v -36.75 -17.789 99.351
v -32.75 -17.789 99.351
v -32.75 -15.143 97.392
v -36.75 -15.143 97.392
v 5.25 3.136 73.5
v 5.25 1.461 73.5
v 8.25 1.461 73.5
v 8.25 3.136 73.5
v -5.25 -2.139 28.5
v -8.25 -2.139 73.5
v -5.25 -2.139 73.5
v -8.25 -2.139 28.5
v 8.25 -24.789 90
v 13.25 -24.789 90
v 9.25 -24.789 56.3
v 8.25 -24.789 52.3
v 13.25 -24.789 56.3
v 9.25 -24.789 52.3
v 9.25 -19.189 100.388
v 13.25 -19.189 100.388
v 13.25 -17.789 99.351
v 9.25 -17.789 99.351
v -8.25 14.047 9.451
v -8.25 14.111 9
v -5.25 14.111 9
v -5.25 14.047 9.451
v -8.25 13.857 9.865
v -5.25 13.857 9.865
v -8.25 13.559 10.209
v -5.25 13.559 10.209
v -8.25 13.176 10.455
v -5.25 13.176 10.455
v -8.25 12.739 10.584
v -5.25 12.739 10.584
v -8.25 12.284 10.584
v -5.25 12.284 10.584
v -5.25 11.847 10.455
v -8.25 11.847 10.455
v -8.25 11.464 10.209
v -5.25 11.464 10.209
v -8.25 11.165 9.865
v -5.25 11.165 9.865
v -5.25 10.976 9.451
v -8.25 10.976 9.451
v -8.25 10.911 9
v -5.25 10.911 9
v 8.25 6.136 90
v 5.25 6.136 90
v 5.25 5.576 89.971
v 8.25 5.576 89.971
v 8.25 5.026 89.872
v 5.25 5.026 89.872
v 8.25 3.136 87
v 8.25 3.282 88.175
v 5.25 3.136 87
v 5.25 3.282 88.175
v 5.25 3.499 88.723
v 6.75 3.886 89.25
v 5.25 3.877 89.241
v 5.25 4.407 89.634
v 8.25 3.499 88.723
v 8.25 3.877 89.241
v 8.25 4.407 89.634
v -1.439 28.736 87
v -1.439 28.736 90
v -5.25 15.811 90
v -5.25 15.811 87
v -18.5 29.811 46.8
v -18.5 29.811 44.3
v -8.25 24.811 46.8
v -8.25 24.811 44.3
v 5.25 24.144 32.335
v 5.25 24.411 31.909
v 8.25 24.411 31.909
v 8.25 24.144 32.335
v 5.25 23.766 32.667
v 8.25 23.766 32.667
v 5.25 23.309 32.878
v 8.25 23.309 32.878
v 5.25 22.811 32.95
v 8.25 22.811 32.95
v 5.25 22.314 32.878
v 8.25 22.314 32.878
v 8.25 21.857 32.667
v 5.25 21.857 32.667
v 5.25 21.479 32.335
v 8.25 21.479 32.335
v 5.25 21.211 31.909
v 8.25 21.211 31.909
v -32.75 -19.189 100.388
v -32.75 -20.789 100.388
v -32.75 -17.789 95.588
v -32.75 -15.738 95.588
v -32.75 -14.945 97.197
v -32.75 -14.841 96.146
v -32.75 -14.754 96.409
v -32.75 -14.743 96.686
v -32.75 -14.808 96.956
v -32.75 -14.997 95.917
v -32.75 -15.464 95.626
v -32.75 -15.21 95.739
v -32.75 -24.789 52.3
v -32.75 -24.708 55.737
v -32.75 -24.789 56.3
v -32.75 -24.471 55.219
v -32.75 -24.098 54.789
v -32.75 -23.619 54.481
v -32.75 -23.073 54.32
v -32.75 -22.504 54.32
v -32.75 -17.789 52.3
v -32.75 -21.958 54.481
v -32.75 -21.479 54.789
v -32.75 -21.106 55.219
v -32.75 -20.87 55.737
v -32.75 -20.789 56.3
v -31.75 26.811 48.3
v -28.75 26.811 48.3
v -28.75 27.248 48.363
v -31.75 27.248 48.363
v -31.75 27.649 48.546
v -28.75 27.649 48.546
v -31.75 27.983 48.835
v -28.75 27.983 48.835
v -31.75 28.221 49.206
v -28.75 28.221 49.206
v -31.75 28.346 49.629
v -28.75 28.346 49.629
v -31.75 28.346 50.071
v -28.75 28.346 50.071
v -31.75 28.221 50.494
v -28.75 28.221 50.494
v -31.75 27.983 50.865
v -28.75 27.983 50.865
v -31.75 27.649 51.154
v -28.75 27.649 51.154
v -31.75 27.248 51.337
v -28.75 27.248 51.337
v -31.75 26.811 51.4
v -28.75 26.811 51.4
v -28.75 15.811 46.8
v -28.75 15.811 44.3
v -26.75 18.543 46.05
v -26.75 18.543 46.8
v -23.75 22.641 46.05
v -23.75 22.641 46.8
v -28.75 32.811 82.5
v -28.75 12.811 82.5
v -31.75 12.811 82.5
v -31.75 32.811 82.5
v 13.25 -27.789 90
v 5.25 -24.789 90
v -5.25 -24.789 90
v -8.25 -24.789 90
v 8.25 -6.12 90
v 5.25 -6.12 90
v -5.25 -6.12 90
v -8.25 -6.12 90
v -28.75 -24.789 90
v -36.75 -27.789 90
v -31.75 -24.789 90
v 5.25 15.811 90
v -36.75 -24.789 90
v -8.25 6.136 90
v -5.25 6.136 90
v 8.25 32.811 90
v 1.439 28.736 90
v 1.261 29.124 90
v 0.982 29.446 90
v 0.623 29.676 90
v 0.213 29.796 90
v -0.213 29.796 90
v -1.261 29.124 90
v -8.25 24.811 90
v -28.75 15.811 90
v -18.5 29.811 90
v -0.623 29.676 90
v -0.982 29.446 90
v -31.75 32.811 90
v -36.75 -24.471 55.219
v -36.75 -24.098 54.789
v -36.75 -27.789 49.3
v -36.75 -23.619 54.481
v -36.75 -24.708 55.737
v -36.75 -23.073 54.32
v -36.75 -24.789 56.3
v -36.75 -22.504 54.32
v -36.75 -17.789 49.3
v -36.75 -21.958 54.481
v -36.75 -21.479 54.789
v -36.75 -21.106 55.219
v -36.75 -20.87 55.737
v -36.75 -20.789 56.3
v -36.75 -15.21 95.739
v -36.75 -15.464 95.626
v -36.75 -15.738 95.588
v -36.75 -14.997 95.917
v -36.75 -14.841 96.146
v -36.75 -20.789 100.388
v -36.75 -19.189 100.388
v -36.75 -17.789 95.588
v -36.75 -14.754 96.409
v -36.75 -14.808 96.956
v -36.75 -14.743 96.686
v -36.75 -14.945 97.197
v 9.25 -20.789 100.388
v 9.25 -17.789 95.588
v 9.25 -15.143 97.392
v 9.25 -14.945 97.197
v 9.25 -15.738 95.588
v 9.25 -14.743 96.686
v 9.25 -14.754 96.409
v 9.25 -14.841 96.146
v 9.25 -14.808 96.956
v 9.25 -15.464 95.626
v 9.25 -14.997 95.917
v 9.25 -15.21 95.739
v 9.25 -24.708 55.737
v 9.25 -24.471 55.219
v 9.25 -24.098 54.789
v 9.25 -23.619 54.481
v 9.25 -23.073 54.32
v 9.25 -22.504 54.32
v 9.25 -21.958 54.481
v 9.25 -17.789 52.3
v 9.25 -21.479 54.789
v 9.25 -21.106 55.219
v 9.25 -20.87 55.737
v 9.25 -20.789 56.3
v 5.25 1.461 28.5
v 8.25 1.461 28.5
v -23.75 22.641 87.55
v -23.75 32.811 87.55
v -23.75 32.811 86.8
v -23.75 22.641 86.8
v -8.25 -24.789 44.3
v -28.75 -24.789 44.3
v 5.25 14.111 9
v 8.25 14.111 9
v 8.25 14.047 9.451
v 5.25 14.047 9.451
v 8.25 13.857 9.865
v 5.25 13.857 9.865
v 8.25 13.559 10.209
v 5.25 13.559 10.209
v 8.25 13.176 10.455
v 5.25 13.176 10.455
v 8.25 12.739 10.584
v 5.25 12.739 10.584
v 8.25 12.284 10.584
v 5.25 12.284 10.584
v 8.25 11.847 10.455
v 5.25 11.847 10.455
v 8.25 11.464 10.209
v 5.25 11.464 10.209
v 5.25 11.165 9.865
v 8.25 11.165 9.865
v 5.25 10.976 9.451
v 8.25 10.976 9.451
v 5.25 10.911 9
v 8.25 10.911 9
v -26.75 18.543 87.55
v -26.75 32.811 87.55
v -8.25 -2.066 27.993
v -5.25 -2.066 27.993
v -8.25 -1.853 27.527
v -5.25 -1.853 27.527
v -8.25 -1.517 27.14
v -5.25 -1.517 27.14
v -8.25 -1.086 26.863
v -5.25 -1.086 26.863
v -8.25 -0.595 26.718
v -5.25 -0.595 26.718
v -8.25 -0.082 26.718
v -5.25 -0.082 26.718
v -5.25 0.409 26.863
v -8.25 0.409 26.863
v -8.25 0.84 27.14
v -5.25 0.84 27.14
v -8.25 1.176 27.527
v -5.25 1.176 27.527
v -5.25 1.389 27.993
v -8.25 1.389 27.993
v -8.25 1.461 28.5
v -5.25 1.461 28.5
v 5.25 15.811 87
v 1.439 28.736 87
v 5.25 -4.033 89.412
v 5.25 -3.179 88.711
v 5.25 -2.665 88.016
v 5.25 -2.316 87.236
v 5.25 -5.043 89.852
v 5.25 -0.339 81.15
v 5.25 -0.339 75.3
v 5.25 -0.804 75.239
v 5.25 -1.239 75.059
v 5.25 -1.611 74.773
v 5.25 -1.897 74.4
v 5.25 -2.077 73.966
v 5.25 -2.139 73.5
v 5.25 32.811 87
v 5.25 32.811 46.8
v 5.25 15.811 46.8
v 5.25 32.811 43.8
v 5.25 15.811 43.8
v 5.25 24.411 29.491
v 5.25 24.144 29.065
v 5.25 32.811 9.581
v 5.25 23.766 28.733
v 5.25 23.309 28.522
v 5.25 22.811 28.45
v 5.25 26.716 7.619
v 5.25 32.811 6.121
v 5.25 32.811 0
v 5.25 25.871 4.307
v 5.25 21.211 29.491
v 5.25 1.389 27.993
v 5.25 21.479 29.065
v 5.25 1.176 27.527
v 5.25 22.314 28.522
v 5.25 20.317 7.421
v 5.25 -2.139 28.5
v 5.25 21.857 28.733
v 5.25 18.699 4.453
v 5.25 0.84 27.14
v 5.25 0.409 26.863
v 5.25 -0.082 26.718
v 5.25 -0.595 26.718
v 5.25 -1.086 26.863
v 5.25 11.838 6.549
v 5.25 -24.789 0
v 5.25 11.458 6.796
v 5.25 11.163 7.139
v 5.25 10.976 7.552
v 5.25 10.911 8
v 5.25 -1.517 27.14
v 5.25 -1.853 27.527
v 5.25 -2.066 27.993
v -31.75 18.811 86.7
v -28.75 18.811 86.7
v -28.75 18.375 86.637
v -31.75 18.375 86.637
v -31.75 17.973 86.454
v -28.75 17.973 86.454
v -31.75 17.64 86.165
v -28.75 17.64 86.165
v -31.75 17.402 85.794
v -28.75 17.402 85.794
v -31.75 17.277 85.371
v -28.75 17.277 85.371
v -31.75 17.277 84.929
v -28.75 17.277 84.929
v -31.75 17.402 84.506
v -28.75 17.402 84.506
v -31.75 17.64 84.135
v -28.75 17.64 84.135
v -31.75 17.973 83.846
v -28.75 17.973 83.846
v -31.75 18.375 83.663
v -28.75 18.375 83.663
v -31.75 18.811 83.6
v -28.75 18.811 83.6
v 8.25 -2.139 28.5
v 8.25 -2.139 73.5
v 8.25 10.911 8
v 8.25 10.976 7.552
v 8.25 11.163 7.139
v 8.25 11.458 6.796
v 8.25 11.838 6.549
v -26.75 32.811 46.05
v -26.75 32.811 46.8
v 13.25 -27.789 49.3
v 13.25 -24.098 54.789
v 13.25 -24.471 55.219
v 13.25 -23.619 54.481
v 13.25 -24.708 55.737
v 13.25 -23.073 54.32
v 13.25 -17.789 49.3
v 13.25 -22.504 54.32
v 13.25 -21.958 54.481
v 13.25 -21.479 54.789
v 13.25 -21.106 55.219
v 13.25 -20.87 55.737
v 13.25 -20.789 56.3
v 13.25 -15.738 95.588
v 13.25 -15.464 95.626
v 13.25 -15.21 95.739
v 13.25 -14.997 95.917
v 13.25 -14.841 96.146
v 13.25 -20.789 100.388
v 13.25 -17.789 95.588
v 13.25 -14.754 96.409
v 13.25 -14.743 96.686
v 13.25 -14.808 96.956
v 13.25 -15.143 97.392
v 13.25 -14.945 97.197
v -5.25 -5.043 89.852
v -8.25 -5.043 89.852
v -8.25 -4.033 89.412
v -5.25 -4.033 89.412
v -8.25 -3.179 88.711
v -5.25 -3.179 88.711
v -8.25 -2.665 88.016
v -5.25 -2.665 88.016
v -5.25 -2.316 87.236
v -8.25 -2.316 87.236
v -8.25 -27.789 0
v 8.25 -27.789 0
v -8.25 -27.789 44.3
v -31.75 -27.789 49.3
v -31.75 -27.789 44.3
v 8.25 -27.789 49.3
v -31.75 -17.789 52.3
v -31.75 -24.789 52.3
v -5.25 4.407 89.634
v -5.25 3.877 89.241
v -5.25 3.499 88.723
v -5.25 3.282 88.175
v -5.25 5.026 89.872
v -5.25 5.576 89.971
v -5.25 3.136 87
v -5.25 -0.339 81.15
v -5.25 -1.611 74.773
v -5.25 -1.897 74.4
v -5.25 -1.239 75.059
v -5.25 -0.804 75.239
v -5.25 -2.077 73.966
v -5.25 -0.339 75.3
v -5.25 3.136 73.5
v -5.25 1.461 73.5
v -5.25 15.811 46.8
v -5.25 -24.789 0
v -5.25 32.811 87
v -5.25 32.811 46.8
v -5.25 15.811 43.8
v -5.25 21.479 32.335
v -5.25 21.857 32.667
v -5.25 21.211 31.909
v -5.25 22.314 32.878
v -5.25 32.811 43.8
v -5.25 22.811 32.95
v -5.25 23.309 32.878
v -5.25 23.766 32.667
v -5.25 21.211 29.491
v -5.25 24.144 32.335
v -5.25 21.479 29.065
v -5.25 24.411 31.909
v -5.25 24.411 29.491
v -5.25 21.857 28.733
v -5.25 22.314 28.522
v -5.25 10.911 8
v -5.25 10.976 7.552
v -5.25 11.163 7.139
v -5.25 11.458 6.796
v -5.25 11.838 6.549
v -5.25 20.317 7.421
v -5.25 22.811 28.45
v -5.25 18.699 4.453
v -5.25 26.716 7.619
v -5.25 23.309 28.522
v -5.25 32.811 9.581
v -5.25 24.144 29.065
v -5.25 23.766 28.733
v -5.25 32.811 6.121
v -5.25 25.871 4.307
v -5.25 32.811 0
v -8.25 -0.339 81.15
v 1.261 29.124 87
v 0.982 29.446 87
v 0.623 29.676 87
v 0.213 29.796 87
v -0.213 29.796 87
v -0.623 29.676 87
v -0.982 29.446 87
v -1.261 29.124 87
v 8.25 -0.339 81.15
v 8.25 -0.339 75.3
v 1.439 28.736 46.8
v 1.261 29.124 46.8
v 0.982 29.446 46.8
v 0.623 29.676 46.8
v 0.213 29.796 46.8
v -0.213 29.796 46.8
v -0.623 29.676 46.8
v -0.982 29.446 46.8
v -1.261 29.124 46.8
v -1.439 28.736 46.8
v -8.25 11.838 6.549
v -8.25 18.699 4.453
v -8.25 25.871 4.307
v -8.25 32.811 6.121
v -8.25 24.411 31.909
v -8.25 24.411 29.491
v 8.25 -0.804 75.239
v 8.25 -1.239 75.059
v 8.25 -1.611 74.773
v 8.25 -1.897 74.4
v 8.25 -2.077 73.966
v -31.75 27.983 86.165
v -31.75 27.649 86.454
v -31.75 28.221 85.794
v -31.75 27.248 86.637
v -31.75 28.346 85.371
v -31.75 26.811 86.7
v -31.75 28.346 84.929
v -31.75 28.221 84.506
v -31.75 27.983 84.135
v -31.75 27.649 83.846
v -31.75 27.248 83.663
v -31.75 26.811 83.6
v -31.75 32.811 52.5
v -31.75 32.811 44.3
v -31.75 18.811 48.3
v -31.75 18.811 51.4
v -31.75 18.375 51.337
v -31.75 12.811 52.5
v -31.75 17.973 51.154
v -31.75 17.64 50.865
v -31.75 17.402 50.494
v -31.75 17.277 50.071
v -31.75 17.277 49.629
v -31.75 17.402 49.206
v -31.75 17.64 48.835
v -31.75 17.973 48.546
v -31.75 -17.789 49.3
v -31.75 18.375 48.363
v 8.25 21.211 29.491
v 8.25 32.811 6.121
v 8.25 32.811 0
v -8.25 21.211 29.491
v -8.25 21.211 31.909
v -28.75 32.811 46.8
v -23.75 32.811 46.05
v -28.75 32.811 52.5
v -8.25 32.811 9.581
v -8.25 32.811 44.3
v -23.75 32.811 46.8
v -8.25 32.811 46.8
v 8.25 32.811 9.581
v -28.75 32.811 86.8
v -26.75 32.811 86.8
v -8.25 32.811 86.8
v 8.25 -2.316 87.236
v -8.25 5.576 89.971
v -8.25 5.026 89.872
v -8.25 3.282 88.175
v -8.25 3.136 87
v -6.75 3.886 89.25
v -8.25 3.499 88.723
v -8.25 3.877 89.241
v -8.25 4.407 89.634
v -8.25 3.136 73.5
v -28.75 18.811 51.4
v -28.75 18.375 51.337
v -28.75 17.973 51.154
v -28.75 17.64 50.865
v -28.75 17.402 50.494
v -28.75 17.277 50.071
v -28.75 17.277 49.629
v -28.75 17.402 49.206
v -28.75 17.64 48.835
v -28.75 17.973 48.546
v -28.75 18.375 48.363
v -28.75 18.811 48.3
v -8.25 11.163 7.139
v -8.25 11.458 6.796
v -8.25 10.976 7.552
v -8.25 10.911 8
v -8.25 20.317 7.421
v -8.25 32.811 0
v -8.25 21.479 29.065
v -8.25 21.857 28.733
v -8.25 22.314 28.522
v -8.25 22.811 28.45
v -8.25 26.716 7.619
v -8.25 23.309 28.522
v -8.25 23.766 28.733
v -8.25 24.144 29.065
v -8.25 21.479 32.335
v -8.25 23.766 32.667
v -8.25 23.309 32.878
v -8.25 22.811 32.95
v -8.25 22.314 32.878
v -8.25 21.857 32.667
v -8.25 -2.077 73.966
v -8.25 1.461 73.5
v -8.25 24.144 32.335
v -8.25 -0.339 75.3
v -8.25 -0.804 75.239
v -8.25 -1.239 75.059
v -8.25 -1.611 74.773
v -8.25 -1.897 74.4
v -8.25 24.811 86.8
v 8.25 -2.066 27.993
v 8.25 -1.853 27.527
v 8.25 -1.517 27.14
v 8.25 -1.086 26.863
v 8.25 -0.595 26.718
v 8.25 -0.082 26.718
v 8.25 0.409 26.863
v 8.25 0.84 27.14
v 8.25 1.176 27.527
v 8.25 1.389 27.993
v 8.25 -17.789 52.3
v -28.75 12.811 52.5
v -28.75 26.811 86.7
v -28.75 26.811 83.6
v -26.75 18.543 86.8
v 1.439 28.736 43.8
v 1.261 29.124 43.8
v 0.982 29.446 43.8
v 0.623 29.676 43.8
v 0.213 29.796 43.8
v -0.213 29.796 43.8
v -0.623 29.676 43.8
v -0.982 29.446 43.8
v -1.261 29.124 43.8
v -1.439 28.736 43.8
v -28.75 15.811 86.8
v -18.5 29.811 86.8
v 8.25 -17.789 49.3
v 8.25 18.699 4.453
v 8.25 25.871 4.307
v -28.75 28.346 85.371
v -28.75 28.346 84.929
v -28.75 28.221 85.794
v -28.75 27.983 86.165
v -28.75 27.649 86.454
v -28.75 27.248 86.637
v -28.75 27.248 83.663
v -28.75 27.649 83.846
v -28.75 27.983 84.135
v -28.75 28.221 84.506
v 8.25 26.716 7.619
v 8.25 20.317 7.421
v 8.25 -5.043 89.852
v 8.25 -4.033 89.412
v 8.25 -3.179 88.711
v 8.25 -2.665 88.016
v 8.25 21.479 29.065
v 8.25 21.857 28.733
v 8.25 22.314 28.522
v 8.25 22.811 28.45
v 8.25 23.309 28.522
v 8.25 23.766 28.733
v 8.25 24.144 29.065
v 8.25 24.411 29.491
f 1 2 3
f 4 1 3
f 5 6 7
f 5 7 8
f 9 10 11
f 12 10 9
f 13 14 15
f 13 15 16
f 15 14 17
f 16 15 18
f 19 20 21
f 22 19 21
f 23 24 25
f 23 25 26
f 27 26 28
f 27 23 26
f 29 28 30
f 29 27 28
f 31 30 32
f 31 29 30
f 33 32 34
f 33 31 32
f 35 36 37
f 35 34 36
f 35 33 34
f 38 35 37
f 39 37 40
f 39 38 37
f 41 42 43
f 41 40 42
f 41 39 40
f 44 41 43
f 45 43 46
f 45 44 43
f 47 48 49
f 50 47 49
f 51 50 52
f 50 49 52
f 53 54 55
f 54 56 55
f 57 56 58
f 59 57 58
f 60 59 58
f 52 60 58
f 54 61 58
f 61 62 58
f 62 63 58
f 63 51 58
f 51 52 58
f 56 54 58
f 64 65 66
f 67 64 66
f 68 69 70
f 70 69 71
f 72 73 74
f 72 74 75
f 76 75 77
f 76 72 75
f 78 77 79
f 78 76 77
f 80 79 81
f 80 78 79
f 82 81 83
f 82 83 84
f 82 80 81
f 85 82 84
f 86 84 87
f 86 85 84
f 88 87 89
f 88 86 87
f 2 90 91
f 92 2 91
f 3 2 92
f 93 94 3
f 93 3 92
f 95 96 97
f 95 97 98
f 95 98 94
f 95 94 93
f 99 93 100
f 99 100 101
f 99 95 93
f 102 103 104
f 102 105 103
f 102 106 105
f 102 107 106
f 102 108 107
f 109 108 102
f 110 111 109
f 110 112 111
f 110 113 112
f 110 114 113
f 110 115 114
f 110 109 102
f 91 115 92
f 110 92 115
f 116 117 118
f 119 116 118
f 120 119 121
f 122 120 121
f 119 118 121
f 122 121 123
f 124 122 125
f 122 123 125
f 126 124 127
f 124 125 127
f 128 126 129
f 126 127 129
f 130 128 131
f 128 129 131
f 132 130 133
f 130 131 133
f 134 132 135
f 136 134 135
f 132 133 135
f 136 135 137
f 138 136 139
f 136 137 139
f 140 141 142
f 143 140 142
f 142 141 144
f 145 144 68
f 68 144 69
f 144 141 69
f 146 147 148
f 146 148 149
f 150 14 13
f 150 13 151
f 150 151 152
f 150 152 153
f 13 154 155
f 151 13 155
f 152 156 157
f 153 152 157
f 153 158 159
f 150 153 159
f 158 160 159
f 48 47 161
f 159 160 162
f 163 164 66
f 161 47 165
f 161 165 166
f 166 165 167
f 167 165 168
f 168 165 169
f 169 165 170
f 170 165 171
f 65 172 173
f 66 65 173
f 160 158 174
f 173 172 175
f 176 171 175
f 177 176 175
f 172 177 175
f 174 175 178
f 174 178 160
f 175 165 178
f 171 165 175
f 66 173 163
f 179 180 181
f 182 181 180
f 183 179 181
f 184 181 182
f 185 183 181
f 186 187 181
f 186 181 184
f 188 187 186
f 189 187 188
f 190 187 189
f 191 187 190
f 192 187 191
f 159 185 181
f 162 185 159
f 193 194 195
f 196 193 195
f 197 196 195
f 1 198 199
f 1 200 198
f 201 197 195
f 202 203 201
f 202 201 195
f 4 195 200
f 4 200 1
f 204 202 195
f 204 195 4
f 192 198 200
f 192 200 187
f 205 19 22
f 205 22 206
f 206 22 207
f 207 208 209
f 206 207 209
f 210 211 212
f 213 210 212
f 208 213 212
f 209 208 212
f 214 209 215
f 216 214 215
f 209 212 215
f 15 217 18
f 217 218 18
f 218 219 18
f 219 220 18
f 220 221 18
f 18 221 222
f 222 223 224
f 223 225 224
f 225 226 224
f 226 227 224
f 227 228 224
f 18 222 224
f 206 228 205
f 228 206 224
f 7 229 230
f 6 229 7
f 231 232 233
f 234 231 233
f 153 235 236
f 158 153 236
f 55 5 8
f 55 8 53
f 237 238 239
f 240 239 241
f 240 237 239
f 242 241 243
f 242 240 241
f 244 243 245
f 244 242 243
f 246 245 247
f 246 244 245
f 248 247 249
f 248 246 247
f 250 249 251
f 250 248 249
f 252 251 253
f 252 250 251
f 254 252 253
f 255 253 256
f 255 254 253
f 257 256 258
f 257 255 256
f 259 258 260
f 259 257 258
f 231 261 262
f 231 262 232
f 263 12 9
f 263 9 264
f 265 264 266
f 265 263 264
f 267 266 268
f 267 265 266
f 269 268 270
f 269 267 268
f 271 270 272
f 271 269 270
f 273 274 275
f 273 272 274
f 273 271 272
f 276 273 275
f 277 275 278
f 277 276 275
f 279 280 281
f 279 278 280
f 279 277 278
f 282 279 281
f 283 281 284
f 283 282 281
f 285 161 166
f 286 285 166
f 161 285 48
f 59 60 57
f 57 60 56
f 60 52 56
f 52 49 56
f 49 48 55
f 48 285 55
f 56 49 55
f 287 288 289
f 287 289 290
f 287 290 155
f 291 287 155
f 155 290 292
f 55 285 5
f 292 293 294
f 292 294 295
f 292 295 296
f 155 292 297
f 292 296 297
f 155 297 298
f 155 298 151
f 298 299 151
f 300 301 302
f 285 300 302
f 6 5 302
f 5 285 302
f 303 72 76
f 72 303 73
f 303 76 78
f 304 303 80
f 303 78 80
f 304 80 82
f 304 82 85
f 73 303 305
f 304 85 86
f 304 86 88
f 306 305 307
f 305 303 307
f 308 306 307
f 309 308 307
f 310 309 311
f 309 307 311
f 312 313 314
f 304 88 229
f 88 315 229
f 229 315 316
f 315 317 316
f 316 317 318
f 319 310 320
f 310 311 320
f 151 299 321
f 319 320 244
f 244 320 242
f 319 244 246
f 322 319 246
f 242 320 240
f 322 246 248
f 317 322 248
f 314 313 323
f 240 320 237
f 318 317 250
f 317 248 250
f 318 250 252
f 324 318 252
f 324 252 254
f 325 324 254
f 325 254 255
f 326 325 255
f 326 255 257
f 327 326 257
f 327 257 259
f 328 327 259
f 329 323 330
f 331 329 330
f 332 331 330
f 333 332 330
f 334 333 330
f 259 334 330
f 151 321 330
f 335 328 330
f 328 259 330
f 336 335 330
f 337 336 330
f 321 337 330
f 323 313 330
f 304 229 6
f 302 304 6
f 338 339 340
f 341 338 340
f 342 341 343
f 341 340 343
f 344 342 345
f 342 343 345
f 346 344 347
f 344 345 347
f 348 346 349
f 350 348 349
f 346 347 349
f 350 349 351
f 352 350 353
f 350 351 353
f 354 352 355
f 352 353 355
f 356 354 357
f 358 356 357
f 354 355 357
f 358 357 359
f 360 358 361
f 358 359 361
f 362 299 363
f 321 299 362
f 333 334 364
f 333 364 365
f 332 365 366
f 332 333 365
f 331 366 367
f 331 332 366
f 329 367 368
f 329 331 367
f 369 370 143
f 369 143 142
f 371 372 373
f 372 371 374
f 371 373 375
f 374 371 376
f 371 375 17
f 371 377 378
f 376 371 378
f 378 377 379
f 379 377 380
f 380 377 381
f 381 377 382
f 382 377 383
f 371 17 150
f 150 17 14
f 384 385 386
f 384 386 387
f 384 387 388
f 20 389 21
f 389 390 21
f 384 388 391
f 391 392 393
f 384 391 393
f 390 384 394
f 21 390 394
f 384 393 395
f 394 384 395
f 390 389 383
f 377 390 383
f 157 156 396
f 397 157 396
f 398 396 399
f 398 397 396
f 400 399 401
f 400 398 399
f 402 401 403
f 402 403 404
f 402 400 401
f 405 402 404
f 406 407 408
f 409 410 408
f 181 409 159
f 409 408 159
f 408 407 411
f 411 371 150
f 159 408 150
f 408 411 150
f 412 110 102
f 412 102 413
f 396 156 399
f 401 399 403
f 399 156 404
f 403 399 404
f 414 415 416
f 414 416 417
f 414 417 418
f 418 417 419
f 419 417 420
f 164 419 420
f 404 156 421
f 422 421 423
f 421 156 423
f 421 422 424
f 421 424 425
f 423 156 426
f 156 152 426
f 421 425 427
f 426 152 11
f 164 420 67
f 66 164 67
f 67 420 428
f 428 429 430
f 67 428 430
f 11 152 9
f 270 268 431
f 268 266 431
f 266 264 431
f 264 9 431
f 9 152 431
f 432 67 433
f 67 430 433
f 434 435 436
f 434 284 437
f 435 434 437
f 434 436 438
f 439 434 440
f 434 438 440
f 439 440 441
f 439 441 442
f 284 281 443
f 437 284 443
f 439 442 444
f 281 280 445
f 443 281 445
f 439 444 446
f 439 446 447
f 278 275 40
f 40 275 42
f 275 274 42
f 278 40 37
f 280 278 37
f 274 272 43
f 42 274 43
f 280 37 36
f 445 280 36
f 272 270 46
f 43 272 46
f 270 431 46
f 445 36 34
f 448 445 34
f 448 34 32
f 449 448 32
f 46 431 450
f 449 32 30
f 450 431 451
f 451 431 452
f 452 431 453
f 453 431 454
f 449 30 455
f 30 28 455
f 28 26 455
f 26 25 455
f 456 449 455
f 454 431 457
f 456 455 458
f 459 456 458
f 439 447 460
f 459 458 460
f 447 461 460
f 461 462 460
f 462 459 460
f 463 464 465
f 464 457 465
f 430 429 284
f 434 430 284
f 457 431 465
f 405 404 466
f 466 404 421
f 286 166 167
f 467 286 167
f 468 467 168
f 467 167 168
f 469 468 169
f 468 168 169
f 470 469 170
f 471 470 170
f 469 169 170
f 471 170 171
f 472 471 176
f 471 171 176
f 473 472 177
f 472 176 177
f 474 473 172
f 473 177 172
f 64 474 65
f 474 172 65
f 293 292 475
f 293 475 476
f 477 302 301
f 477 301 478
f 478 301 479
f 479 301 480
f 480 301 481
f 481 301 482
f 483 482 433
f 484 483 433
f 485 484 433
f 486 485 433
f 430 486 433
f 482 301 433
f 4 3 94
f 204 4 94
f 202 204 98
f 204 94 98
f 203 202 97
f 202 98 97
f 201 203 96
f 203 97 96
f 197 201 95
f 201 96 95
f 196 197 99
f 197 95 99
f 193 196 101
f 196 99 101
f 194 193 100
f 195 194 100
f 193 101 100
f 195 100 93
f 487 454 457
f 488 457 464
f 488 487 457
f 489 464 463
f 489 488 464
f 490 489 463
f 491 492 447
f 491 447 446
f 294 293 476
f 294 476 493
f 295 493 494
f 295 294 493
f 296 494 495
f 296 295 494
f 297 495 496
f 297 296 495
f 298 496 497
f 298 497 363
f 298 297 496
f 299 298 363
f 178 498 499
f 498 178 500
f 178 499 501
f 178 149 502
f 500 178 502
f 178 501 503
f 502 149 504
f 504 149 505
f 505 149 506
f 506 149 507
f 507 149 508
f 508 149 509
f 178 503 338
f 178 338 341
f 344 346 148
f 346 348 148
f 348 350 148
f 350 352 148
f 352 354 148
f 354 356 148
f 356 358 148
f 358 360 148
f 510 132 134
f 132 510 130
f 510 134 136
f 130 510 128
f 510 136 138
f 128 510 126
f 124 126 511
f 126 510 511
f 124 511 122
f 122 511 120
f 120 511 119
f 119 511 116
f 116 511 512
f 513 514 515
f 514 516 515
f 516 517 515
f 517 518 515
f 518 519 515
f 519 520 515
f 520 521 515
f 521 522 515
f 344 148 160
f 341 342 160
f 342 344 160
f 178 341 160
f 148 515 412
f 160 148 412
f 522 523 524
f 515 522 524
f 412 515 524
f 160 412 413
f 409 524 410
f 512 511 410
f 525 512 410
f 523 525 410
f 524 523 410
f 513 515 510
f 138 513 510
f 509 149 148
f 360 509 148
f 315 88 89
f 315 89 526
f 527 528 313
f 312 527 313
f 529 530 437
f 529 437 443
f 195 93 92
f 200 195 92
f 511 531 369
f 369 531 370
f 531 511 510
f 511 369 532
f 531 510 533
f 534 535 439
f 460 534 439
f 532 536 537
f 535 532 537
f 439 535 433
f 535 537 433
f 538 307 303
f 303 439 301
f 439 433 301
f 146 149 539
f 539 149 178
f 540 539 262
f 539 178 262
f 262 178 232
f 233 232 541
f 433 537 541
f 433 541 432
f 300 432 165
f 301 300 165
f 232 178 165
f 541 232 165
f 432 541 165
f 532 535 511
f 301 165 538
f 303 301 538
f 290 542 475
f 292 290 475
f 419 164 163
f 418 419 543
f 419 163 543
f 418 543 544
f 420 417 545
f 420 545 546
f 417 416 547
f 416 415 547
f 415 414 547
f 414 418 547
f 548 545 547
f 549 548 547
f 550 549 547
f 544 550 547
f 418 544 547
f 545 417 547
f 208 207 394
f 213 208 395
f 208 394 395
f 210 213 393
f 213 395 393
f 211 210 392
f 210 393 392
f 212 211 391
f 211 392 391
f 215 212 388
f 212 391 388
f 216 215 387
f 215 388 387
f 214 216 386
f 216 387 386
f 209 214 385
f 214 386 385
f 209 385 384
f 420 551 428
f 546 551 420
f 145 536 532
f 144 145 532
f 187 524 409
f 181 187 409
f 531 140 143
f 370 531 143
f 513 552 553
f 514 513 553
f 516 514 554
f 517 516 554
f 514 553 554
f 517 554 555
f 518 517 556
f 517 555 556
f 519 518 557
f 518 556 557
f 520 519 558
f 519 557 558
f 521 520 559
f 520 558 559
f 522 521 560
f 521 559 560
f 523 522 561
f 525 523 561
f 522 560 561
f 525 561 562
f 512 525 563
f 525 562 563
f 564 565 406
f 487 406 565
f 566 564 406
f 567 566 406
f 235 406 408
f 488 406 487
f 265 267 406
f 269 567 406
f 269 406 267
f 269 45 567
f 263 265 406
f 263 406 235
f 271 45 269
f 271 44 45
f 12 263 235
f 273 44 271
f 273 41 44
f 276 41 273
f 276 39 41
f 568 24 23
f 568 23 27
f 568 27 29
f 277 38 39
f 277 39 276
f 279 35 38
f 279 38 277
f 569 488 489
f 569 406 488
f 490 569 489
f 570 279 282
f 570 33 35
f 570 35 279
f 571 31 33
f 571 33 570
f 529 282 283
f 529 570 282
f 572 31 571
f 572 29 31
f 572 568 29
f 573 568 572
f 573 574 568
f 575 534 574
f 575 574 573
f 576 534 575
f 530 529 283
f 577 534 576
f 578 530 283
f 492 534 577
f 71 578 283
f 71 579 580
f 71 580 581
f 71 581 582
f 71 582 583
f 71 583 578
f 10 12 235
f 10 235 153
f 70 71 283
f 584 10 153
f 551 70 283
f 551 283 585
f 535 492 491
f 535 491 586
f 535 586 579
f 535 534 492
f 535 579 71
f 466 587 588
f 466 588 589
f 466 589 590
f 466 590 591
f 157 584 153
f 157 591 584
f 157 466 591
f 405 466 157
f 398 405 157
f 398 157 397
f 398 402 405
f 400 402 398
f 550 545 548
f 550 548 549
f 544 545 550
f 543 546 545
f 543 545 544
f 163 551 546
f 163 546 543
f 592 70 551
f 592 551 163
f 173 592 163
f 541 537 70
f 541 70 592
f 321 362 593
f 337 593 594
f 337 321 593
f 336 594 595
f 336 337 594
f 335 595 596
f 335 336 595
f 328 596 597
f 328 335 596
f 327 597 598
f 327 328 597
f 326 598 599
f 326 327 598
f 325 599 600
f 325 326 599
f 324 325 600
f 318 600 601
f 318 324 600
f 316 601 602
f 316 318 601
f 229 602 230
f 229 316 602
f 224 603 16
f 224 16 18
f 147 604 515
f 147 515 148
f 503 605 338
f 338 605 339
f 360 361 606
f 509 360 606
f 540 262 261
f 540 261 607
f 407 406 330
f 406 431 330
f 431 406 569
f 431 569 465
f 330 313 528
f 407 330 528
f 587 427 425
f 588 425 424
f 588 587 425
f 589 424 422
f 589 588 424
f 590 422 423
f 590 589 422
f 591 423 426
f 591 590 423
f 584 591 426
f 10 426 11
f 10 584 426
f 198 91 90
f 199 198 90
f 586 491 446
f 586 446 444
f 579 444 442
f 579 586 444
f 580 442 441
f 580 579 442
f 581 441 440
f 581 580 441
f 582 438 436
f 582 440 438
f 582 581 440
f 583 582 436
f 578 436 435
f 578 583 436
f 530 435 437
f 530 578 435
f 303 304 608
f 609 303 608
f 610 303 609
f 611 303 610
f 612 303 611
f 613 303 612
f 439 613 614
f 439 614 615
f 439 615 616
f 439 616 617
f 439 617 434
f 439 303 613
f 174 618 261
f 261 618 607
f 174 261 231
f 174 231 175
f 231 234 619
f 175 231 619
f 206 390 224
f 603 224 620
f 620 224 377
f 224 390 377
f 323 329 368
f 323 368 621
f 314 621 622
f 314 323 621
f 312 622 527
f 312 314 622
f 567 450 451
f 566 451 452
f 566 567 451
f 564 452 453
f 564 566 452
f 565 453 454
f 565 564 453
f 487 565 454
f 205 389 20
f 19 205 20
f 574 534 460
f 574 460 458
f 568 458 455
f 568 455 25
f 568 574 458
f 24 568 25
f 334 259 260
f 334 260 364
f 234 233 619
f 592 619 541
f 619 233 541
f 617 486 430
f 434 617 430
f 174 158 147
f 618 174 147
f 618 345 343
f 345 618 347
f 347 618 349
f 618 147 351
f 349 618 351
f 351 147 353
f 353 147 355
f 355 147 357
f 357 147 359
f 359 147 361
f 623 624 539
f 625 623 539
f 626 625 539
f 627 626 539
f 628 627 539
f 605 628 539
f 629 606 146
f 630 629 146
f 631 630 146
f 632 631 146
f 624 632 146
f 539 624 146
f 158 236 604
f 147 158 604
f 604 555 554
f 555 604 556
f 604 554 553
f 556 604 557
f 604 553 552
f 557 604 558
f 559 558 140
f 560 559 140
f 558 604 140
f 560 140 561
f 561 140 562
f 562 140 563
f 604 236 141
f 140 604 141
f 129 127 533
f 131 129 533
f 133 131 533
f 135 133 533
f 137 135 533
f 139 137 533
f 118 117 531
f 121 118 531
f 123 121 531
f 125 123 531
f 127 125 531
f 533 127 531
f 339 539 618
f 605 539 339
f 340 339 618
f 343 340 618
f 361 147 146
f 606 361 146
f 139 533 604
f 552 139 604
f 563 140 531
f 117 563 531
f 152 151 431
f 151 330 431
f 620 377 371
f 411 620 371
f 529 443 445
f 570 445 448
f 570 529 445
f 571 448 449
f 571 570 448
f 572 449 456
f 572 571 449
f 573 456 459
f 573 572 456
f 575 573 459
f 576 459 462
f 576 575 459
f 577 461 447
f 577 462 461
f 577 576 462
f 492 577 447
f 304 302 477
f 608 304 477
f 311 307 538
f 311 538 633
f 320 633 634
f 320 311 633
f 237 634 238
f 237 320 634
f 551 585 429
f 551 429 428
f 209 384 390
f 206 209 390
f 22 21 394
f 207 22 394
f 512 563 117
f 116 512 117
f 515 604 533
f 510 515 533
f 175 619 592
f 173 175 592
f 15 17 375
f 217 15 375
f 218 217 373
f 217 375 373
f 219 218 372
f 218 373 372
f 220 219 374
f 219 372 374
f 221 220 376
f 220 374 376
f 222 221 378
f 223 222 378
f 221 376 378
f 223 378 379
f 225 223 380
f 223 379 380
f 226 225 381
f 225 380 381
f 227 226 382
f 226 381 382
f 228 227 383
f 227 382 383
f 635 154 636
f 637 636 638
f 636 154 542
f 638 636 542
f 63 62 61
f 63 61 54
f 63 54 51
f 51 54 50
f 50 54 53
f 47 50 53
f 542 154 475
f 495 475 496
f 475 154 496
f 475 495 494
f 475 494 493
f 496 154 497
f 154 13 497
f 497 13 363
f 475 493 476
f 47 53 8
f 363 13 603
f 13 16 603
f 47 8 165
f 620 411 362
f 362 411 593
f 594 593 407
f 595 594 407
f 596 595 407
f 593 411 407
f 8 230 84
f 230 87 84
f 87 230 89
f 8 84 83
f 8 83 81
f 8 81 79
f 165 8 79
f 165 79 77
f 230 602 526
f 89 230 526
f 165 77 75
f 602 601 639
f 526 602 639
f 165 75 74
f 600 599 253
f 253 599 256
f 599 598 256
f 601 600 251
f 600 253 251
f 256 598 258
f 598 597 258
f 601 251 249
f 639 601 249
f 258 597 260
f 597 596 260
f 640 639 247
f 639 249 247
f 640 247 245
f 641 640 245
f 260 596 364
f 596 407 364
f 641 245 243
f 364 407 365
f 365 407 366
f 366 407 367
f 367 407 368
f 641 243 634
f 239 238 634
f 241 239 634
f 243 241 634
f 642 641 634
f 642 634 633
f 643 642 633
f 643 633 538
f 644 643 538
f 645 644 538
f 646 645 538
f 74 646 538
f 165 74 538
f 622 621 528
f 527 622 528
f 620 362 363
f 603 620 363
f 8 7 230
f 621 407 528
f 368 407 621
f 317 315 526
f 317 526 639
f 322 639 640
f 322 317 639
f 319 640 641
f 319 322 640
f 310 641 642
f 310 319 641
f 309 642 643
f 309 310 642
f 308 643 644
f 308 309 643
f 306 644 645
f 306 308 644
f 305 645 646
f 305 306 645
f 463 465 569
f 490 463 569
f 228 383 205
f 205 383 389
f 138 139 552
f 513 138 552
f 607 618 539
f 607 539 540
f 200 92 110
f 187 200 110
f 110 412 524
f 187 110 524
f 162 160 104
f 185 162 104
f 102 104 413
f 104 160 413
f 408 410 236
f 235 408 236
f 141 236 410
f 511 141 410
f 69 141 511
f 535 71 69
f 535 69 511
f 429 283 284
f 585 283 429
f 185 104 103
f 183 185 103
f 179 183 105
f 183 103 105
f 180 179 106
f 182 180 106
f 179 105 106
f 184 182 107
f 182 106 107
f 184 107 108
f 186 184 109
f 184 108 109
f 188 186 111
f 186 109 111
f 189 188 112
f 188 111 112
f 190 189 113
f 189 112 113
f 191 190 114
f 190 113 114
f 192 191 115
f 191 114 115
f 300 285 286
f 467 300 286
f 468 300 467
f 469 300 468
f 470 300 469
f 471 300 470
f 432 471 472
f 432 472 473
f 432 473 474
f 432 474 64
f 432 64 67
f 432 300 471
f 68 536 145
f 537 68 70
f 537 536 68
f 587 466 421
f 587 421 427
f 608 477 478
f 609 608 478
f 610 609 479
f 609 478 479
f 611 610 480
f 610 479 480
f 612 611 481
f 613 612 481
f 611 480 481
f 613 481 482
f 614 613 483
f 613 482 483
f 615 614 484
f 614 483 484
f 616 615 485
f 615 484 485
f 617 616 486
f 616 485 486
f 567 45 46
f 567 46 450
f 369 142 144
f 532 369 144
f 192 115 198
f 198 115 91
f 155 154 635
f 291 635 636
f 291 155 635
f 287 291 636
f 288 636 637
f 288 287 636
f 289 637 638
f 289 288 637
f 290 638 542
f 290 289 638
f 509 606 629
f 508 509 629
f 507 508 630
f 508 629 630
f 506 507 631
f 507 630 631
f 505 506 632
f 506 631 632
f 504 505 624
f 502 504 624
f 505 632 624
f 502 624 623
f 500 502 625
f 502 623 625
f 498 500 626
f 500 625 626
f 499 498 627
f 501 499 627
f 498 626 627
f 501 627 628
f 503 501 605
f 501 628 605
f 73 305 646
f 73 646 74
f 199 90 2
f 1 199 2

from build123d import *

# Parameters (mm, degrees)
SKETCH1_W                    = 20.5
SKETCH1_H                    = 3
SKETCH1_W_2                  = 3
SKETCH1_W_3                  = 10.5
SKETCH1_H_2                  = 2
MAIN_EXTRUDE_DEPTH           = 90
SWITCH_LEVER_START           = -16.5
SWITCH_LEVER_HOLES_DEPTH     = 16.5
SERVO_START                  = -23.5
SKETCH3_W                    = 30
SKETCH3_H                    = 20
SKETCH3_W_2                  = 44.3
SKETCH3_H_2                  = 60.6
SERVO_MOUNT_SLOTS_DEPTH      = 23.5
SERVO_HOLE_EXPANSION_REACH   = 70.75
SKETCH4_W                    = 20.5
SKETCH4_H                    = 8
SERVO_HOLE_EXPANSION_2_REACH = 115.051
SKETCH5_W                    = 20.5
SKETCH5_H                    = 40
SKETCH5_W_2                  = 10.5
SKETCH5_H_2                  = 12
SKETCH5_H_3                  = 68
TAB1_DEPTH                   = 5
TAB2_START                   = -45
TAB2_DEPTH                   = 5
TAB_SPACER_REACH             = 124.885
SKETCH7_W                    = 1
SKETCH7_H                    = 48.088
LEVER_SHELF_DEPTH            = 10.5
SKETCH10_W                   = 10.5
SKETCH10_H                   = 3.45
CUT_EXTRUDE2_DEPTH           = 45
BOSS_EXTRUDE1_DEPTH          = 3
BOSS_EXTRUDE2_START          = -43.2
BOSS_EXTRUDE2_DEPTH          = 3
FILLET1_SIZE                 = 3
CUT_EXTRUDE3_REACH           = 124.885
SKETCH12_W                   = 3
SKETCH12_H                   = 0.75
CUT_EXTRUDE4_REACH           = 116.801
FILLET2_R                    = 4


with BuildPart() as part:
    # Sketch1 → Main Extrude (new body)
    with BuildSketch(Plane.XY):
        Polygon((-8.25, 32.811469611), (-28.75, 32.811469611), (-28.75, 15.811469611), (-18.5, 29.811469611), (-8.25, 24.811469611), align=None)
        Polygon((-28.75, 15.811469611), (-28.75, 32.811469611), (-31.75, 32.811469611), (-31.75, -24.788530389), (-28.75, -24.788530389), align=None)
        with Locations((-18.5, -26.288530389)):
            Rectangle(SKETCH1_W, SKETCH1_H)
        with Locations((-30.25, -26.288530389)):
            Rectangle(SKETCH1_W_2, SKETCH1_H)
        with Locations((-6.75, -26.288530389)):
            Rectangle(SKETCH1_W_2, SKETCH1_H)
        Polygon((-5.25, 32.811469611), (-8.25, 32.811469611), (-8.25, 24.811469611), (-8.25, -24.788530389), (-5.25, -24.788530389), (-5.25, 3.911469611), (-5.25, 5.911469611), align=None)
        with Locations((0, -26.288530389)):
            Rectangle(SKETCH1_W_3, SKETCH1_H)
        with Locations((6.75, -26.288530389)):
            Rectangle(SKETCH1_W_2, SKETCH1_H)
        Polygon((5.25, 32.811469611), (5.25, 5.911469611), (5.25, 3.911469611), (5.25, -24.788530389), (8.25, -24.788530389), (8.25, 32.811469611), align=None)
        with Locations((0, 4.911469611)):
            Rectangle(SKETCH1_W_3, SKETCH1_H_2)
    extrude(amount=MAIN_EXTRUDE_DEPTH)

    # Sketch2 → Switch/Lever Holes (cut)
    with BuildSketch(Plane(origin=(8.25, 0, 0), x_dir=(0, 0, -1), z_dir=(1, 0, 0)).offset(SWITCH_LEVER_START)):
        with BuildLine():
            Line((-90, -0.338530389), (-75.3, -0.338530389))
            ThreePointArc((-75.3, -0.338530389), (-74.772792206, -1.611322596), (-73.5, -2.138530389))
            Line((-73.5, -2.138530389), (-28.5, -2.138530389))
            ThreePointArc((-28.5, -2.138530389), (-26.7, -0.338530389), (-28.5, 1.461469611))
            Line((-28.5, 1.461469611), (-73.5, 1.461469611))
            Line((-73.5, 1.461469611), (-73.5, 3.136469611))
            Line((-73.5, 3.136469611), (-90, 3.136469611))
            Line((-90, 3.136469611), (-90, -0.338530389))
        make_face()
        with BuildLine():
            Line((-29.491127656, 24.411469611), (-31.908872344, 24.411469611))
            ThreePointArc((-31.908872344, 24.411469611), (-32.95, 22.811469611), (-31.908872344, 21.211469611))
            Line((-31.908872344, 21.211469611), (-29.491127656, 21.211469611))
            ThreePointArc((-29.491127656, 21.211469611), (-28.45, 22.811469611), (-29.491127656, 24.411469611))
        make_face()
        with BuildLine():
            Line((-9, 10.911469611), (-8, 10.911469611))
            ThreePointArc((-8, 10.911469611), (-7.139020973, 11.162872148), (-6.548607336, 11.838075717))
            ThreePointArc((-6.548607336, 11.838075717), (-4.132373754, 22.279858493), (-6.120885638, 32.811469611))
            Line((-6.120885638, 32.811469611), (-9.58131915, 32.811469611))
            ThreePointArc((-9.58131915, 32.811469611), (-7.295349446, 23.52349699), (-9, 14.111469611))
            ThreePointArc((-9, 14.111469611), (-10.6, 12.511469611), (-9, 10.911469611))
        make_face()
    extrude(amount=SWITCH_LEVER_HOLES_DEPTH, mode=Mode.SUBTRACT)

    # Sketch3 → Servo Mount Slots (cut)
    with BuildSketch(Plane.ZY.offset(31.75).offset(SERVO_START)):
        with Locations((67.5, 22.811469611)):
            Rectangle(SKETCH3_W, SKETCH3_H)
        with BuildLine():
            Line((51.4, 26.811469611), (51.4, 18.811469611))
            ThreePointArc((51.4, 18.811469611), (49.85, 17.261469611), (48.3, 18.811469611))
            Line((48.3, 18.811469611), (48.3, 26.811469611))
            ThreePointArc((48.3, 26.811469611), (49.85, 28.361469611), (51.4, 26.811469611))
        make_face()
        with BuildLine():
            Line((86.7, 26.811469611), (86.7, 18.811469611))
            ThreePointArc((86.7, 18.811469611), (85.15, 17.261469611), (83.6, 18.811469611))
            Line((83.6, 18.811469611), (83.6, 26.811469611))
            ThreePointArc((83.6, 26.811469611), (85.15, 28.361469611), (86.7, 26.811469611))
        make_face()
        with Locations((22.15, 2.511469611)):
            Rectangle(SKETCH3_W_2, SKETCH3_H_2)
    extrude(amount=SERVO_MOUNT_SLOTS_DEPTH, mode=Mode.SUBTRACT)

    # Servo Hole Expansion: up to this face of the body (flat: up to its plane)
    servo_hole_expansion_end = Plane(part.part.faces().sort_by_distance((-9.616666667, 26.144802944, 83.6))[0])
    # Sketch4 → Servo Hole Expansion (cut, up to the picked face)
    with BuildSketch(Plane(origin=(0, 0, 51.4), x_dir=(-1, 0, 0), z_dir=(0, 0, -1)), mode=Mode.PRIVATE) as servo_hole_expansion_sk1:
        with Locations((18.5, 28.811469611)):
            Rectangle(SKETCH4_W, SKETCH4_H)
    servo_hole_expansion_tool1 = split(extrude(servo_hole_expansion_sk1.sketch, amount=-SERVO_HOLE_EXPANSION_REACH, mode=Mode.PRIVATE), bisect_by=servo_hole_expansion_end, keep=Keep.BOTH, mode=Mode.PRIVATE)
    add(servo_hole_expansion_tool1.solids().sort_by(Axis((-18.5, 28.81147, 51.4), (0, 0, 1)))[0], mode=Mode.SUBTRACT)

    # Servo Hole Expansion 2: up to this face of the body (flat: up to its plane)
    servo_hole_expansion_2_end = Plane(part.part.faces().sort_by_distance((-18.5, -24.788530389, 67.15))[0])
    # Sketch5 → Servo Hole Expansion 2 (cut, up to the picked face)
    with BuildSketch(Plane(origin=(0, 32.811469611, 0), x_dir=(1, 0, 0), z_dir=(0, 1, 0)), mode=Mode.PRIVATE) as servo_hole_expansion_2_sk1:
        with Locations((-18.5, -66.8)):
            Rectangle(SKETCH5_W, SKETCH5_H)
    servo_hole_expansion_2_tool1 = split(extrude(servo_hole_expansion_2_sk1.sketch, amount=-SERVO_HOLE_EXPANSION_2_REACH, mode=Mode.PRIVATE), bisect_by=servo_hole_expansion_2_end, keep=Keep.BOTH, mode=Mode.PRIVATE)
    # Sketch5 → Servo Hole Expansion 2 (cut, up to the picked face)
    with BuildSketch(Plane(origin=(0, 32.811469611, 0), x_dir=(1, 0, 0), z_dir=(0, 1, 0)), mode=Mode.PRIVATE) as servo_hole_expansion_2_sk2:
        with Locations((0, -6)):
            Rectangle(SKETCH5_W_2, SKETCH5_H_2)
    servo_hole_expansion_2_tool2 = split(extrude(servo_hole_expansion_2_sk2.sketch, amount=-SERVO_HOLE_EXPANSION_2_REACH, mode=Mode.PRIVATE), bisect_by=servo_hole_expansion_2_end, keep=Keep.BOTH, mode=Mode.PRIVATE)
    # Sketch5 → Servo Hole Expansion 2 (cut, up to the picked face)
    with BuildSketch(Plane(origin=(0, 32.811469611, 0), x_dir=(1, 0, 0), z_dir=(0, 1, 0)), mode=Mode.PRIVATE) as servo_hole_expansion_2_sk3:
        with Locations((0, -56)):
            Rectangle(SKETCH5_W_2, SKETCH5_H_3)
    servo_hole_expansion_2_tool3 = split(extrude(servo_hole_expansion_2_sk3.sketch, amount=-SERVO_HOLE_EXPANSION_2_REACH, mode=Mode.PRIVATE), bisect_by=servo_hole_expansion_2_end, keep=Keep.BOTH, mode=Mode.PRIVATE)
    add(servo_hole_expansion_2_tool1.solids().sort_by(Axis((-18.5, 32.81147, 66.8), (0, -1, 0)))[0], mode=Mode.SUBTRACT)
    add(servo_hole_expansion_2_tool2.solids().sort_by(Axis((0, 32.81147, 6), (0, -1, 0)))[0], mode=Mode.SUBTRACT)
    add(servo_hole_expansion_2_tool3.solids().sort_by(Axis((0, 32.81147, 56), (0, -1, 0)))[0], mode=Mode.SUBTRACT)

    # Sketch6 → Tab1 (add)
    with BuildSketch(Plane.ZY.offset(31.75)):
        with BuildLine():
            Line((49.3, -17.788530389), (49.3, -27.788530389))
            Line((49.3, -27.788530389), (90, -27.788530389))
            Line((90, -27.788530389), (90, -24.788530389))
            Line((90, -24.788530389), (56.3, -24.788530389))
            ThreePointArc((56.3, -24.788530389), (54.3, -22.788530389), (56.3, -20.788530389))
            Line((56.3, -20.788530389), (90, -20.788530389))
            Line((90, -20.788530389), (90, -17.788530389))
            Line((90, -17.788530389), (49.3, -17.788530389))
        make_face()
        Polygon((95.588, -17.788530389), (90, -17.788530389), (90, -20.788530389), (100.388, -20.788530389), (100.388, -19.188530389), (99.35106603, -17.788530389), align=None)
        with BuildLine():
            Line((95.588, -15.738158077), (95.588, -17.788530389))
            Line((95.588, -17.788530389), (99.35106603, -17.788530389))
            Line((99.35106603, -17.788530389), (97.391585488, -15.142968726))
            ThreePointArc((97.391585488, -15.142968726), (96.274619631, -14.788530389), (95.588, -15.738158077))
        make_face()
    extrude(amount=TAB1_DEPTH)

    # Sketch6<4> → Tab2 (add)
    with BuildSketch(Plane.ZY.offset(31.75).offset(TAB2_START)):
        with BuildLine():
            Line((49.3, -17.788530389), (49.3, -27.788530389))
            Line((49.3, -27.788530389), (90, -27.788530389))
            Line((90, -27.788530389), (90, -24.788530389))
            Line((90, -24.788530389), (56.3, -24.788530389))
            ThreePointArc((56.3, -24.788530389), (54.3, -22.788530389), (56.3, -20.788530389))
            Line((56.3, -20.788530389), (90, -20.788530389))
            Line((90, -20.788530389), (90, -17.788530389))
            Line((90, -17.788530389), (49.3, -17.788530389))
        make_face()
        Polygon((95.588, -17.788530389), (90, -17.788530389), (90, -20.788530389), (100.388, -20.788530389), (100.388, -19.188530389), (99.35106603, -17.788530389), align=None)
        with BuildLine():
            Line((95.588, -15.738158077), (95.588, -17.788530389))
            Line((95.588, -17.788530389), (99.35106603, -17.788530389))
            Line((99.35106603, -17.788530389), (97.391585488, -15.142968726))
            ThreePointArc((97.391585488, -15.142968726), (96.274619631, -14.788530389), (95.588, -15.738158077))
        make_face()
    extrude(amount=TAB2_DEPTH)

    # Tab Spacer: up to this face of the body (flat: up to its plane)
    tab_spacer_end = Plane(part.part.faces().sort_by_distance((-18.5, -24.788530389, 67.15))[0])
    # Sketch7 → Tab Spacer (cut, up to the picked face)
    with BuildSketch(Plane(origin=(0, 32.811469611, 0), x_dir=(1, 0, 0), z_dir=(0, 1, 0)), mode=Mode.PRIVATE) as tab_spacer_sk1:
        with Locations((-32.25, -76.344)):
            Rectangle(SKETCH7_W, SKETCH7_H)
    tab_spacer_tool1 = split(extrude(tab_spacer_sk1.sketch, amount=-TAB_SPACER_REACH, mode=Mode.PRIVATE), bisect_by=tab_spacer_end, keep=Keep.BOTH, mode=Mode.PRIVATE)
    # Sketch7 → Tab Spacer (cut, up to the picked face)
    with BuildSketch(Plane(origin=(0, 32.811469611, 0), x_dir=(1, 0, 0), z_dir=(0, 1, 0)), mode=Mode.PRIVATE) as tab_spacer_sk2:
        with Locations((8.75, -76.344)):
            Rectangle(SKETCH7_W, SKETCH7_H)
    tab_spacer_tool2 = split(extrude(tab_spacer_sk2.sketch, amount=-TAB_SPACER_REACH, mode=Mode.PRIVATE), bisect_by=tab_spacer_end, keep=Keep.BOTH, mode=Mode.PRIVATE)
    add(tab_spacer_tool1.solids().sort_by(Axis((-32.25, 32.81147, 76.344), (0, -1, 0)))[0], mode=Mode.SUBTRACT)
    add(tab_spacer_tool2.solids().sort_by(Axis((8.75, 32.81147, 76.344), (0, -1, 0)))[0], mode=Mode.SUBTRACT)

    # Sketch8 → Lever Shelf (cut)
    with BuildSketch(Plane(origin=(-5.25, 0, 0), x_dir=(0, 0, -1), z_dir=(1, 0, 0))):
        with BuildLine():
            Line((-22, 5.911469611), (-22, 3.911469611))
            Line((-22, 3.911469611), (-17, 3.911469611))
            ThreePointArc((-17, 3.911469611), (-19.692582404, 4.430013602), (-22, 5.911469611))
        make_face()
    extrude(amount=LEVER_SHELF_DEPTH, mode=Mode.SUBTRACT)

    # Sketch10 → Cut-Extrude2 (cut)
    with BuildSketch(Plane(origin=(0, 0, 0), x_dir=(-1, 0, 0), z_dir=(0, 0, -1))):
        with Locations((0, 4.186469611)):
            Rectangle(SKETCH10_W, SKETCH10_H)
    extrude(amount=-CUT_EXTRUDE2_DEPTH, mode=Mode.SUBTRACT)

    # Sketch11 → Boss-Extrude1 (add)
    with BuildSketch(Plane.XY.offset(90)):
        with BuildLine():
            Line((-5.25, 32.811469611), (5.25, 32.811469611))
            Line((5.25, 32.811469611), (5.25, 15.811469611))
            Line((5.25, 15.811469611), (1.438746649, 28.735743203))
            ThreePointArc((1.438746649, 28.735743203), (0, 29.811469611), (-1.438746649, 28.735743203))
            Line((-1.438746649, 28.735743203), (-5.25, 15.811469611))
            Line((-5.25, 15.811469611), (-5.25, 32.811469611))
        make_face()
    extrude(amount=-BOSS_EXTRUDE1_DEPTH)

    # Sketch11<2> → Boss-Extrude2 (add)
    with BuildSketch(Plane.XY.offset(90).offset(BOSS_EXTRUDE2_START)):
        with BuildLine():
            Line((-5.25, 32.811469611), (5.25, 32.811469611))
            Line((5.25, 32.811469611), (5.25, 15.811469611))
            Line((5.25, 15.811469611), (1.438746649, 28.735743203))
            ThreePointArc((1.438746649, 28.735743203), (0, 29.811469611), (-1.438746649, 28.735743203))
            Line((-1.438746649, 28.735743203), (-5.25, 15.811469611))
            Line((-5.25, 15.811469611), (-5.25, 32.811469611))
        make_face()
    extrude(amount=-BOSS_EXTRUDE2_DEPTH)

    # Fillet1
    # a fillet whose section is not a circle: 3 mm, written as the material it takes off along each edge
    with BuildSketch(Plane(origin=(-2.25, -0.338530389, 90), x_dir=(0, -1, 0), z_dir=(1, 0, 0)), Plane(origin=(-15.75, -0.338530389, 90), x_dir=(0, -1, 0), z_dir=(1, 0, 0))) as fillet1_piece_1:
        with BuildLine():
            Bezier((FILLET1_SIZE, 0), (0, 0), (0, FILLET1_SIZE), weights=[1, 1, 1])
            Line((0, FILLET1_SIZE), (0, 0))
            Line((0, 0), (FILLET1_SIZE, 0))
        make_face()
    extrude(amount=18, mode=Mode.SUBTRACT)
    with BuildSketch(Plane(origin=(-15.75, 3.136469611, 90), x_dir=(0, 1, 0), z_dir=(1, 0, 0)), Plane(origin=(-2.25, 3.136469611, 90), x_dir=(0, 1, 0), z_dir=(1, 0, 0))) as fillet1_piece_2:
        with BuildLine():
            Bezier((FILLET1_SIZE, 0), (0, 0), (0, -FILLET1_SIZE), weights=[1, 1, 1])
            Line((0, -FILLET1_SIZE), (0, 0))
            Line((0, 0), (FILLET1_SIZE, 0))
        make_face()
    extrude(amount=18, mode=Mode.SUBTRACT)

    # Cut-Extrude3: up to this plane
    cut_extrude3_end = Plane(origin=(-26.253505133, 19.221316258, 90), z_dir=(-0.806862820153453, 0.5907388504694919, 0))
    # Sketch12 → Cut-Extrude3 (cut, up to the surface)
    with BuildSketch(Plane(origin=(0, 32.811469611, 0), x_dir=(1, 0, 0), z_dir=(0, 1, 0)), mode=Mode.PRIVATE) as cut_extrude3_sk1:
        with Locations((-25.25, -87.175)):
            Rectangle(SKETCH12_W, SKETCH12_H)
    cut_extrude3_tool1 = split(extrude(cut_extrude3_sk1.sketch, amount=-CUT_EXTRUDE3_REACH, mode=Mode.PRIVATE), bisect_by=cut_extrude3_end, keep=Keep.BOTH, mode=Mode.PRIVATE)
    add(cut_extrude3_tool1.solids().sort_by_distance((-25.25, 32.81147, 87.175))[0], mode=Mode.SUBTRACT)
    # Sketch12 → Cut-Extrude3 (cut, up to the surface)
    with BuildSketch(Plane(origin=(0, 32.811469611, 0), x_dir=(1, 0, 0), z_dir=(0, 1, 0)), mode=Mode.PRIVATE) as cut_extrude3_sk2:
        with Locations((-25.25, -46.425)):
            Rectangle(SKETCH12_W, SKETCH12_H)
    cut_extrude3_tool2 = split(extrude(cut_extrude3_sk2.sketch, amount=-CUT_EXTRUDE3_REACH, mode=Mode.PRIVATE), bisect_by=cut_extrude3_end, keep=Keep.BOTH, mode=Mode.PRIVATE)
    add(cut_extrude3_tool2.solids().sort_by_distance((-25.25, 32.81147, 46.425))[0], mode=Mode.SUBTRACT)

    # Cut-Extrude4: up to this face of the body (flat: up to its plane)
    cut_extrude4_end = Plane(part.part.faces().sort_by_distance((-8.25, 2.844014884, 44.117576332))[0])
    # Sketch13 → Cut-Extrude4 (cut, up to the picked face)
    with BuildSketch(Plane(origin=(8.25, 0, 0), x_dir=(0, 0, -1), z_dir=(1, 0, 0)), mode=Mode.PRIVATE) as cut_extrude4_sk1:
        Polygon((-81.15, -0.338530389), (-90, -0.338530389), (-90, -3.213530389), align=None)
    cut_extrude4_tool1 = split(extrude(cut_extrude4_sk1.sketch, amount=-CUT_EXTRUDE4_REACH, mode=Mode.PRIVATE), bisect_by=cut_extrude4_end, keep=Keep.BOTH, mode=Mode.PRIVATE)
    add(cut_extrude4_tool1.solids().sort_by(Axis((8.25, -1.296864, 87.05), (-1, 0, 0)))[0], mode=Mode.SUBTRACT)

    # Fillet2
    fillet2_edges = [part.edges().sort_by_distance(p)[0] for p in [
        (6.7499997, -3.213095302, 89.998660688),
        (-6.7499997, -3.213095302, 89.998660688),
    ]]
    fillet(fillet2_edges, radius=FILLET2_R)


solid = part.part
